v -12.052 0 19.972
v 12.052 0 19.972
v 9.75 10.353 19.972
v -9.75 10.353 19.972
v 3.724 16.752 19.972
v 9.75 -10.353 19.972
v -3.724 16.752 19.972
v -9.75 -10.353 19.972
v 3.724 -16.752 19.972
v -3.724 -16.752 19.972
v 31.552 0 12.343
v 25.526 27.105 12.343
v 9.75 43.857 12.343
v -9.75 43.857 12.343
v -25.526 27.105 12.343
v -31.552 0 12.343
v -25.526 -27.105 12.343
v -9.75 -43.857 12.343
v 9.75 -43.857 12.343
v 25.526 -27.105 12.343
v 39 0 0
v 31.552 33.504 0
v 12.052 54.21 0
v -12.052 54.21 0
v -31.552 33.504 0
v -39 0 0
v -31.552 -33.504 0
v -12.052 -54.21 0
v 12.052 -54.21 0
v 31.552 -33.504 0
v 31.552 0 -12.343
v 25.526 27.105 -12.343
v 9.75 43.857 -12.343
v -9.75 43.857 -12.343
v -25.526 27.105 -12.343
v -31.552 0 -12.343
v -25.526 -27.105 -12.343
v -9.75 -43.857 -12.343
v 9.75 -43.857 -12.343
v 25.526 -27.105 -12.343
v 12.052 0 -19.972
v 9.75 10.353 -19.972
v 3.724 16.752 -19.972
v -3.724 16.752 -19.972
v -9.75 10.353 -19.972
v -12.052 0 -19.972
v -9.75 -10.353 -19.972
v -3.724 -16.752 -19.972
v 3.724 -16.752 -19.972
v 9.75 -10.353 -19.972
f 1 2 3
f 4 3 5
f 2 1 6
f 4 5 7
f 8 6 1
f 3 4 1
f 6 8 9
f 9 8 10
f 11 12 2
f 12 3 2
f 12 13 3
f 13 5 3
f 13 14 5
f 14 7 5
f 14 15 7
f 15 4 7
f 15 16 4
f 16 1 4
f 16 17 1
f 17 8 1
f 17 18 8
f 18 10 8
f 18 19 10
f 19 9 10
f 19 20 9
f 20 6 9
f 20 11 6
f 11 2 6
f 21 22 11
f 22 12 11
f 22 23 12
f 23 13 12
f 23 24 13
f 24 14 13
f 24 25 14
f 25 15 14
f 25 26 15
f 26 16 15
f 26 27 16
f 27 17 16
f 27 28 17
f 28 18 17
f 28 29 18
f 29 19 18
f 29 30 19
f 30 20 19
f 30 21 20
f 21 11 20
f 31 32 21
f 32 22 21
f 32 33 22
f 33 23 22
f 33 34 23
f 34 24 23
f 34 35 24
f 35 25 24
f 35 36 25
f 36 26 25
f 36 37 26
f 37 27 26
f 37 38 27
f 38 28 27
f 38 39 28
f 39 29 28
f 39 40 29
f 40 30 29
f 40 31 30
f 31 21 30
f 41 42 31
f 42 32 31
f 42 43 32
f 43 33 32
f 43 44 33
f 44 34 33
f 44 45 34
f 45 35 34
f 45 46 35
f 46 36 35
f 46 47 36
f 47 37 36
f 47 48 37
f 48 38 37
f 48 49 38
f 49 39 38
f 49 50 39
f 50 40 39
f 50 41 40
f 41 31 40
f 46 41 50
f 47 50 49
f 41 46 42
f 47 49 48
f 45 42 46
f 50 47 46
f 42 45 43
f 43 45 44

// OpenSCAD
// Generated by SolidPython 1.0.1 on 2020-07-29 00:46:51


scale(v = [13, 19, 7]) {
	sphere(r = 3);
}
/***********************************************
*********      SolidPython code:      **********
************************************************
 
# import packages: SolidPython
from solid import *
from solid.utils import *
from itertools import chain, combinations, permutations


class Resize:

    def __init__(self, scad_file):
        self.scad_file = scad_file
        #self.scad_file = import_scad(scad_file)
        # cone/cylinder param:
        self.r1 = 0
        self.r2 = 0
        self.h = 0
        # rectangular prism param:
        self.w = 0
        self.l = 0
        # ellipse param:
        self.r = 0

    # import OpenScad code (file name corresponds to shape)


    # classify shape + parameters
    def assign(self, param1, param2, param3):
        if self.scad_file == 'cone.scad':
            self.r1 = param1
            self.r2 = param2
            self.h = param3
        elif self.scad_file == 'cylinder.scad':
            self.r1 = param1
            self.r2 = param2
            self.h = param3
        elif self.scad_file == 'rectangularPrism.scad':
            self.h = param1
            self.l = param2
            self.w = param3
        else:
            self.r = param1
            self.h = param2

    # resize parameters
    def iterate(self):
        x = range(3, 20, 2)
        i = 1
        if self.scad_file == 'cone.scad':
            tempList = list(permutations(x, 2))
            for temp in tempList:
                param1 = temp[0]
                param2 = temp[1]
                filepath = 'produced_scad_files/' + 'cone' + str(param1) + '_' + str(param2) + '_' + '.scad'
                scad_render_to_file(cylinder(h=param1, r1=param2, r2=0), filepath)

        elif self.scad_file == 'cylinder.scad':
            tempList = list(permutations(x, 3))
            for temp in tempList:
                param1 = temp[0]
                param2 = temp[1]
                filepath = 'produced_scad_files/' + 'cylinder' + str(param1) + '_' + str(param2) + '_' + '.scad'
                scad_render_to_file(cylinder(h=param1, r1=param2, r2=param2), filepath)

        elif self.scad_file == 'rectangularPrism.scad':
            tempList = list(permutations(x, 3))
            for temp in tempList:
                param1 = temp[0]
                param2 = temp[1]
                param3 = temp[2]
                filepath = 'produced_scad_files/' + 'rectangularPrism' + str(param1) + '_' + str(param2) + '_' + str(
                    param3) + '.scad'
                scad_render_to_file(cube(size=(param1, param2, param3)), filepath)

        elif self.scad_file == 'ellipse.scad':
            tempList = list(permutations(x, 4))
            for temp in tempList:
                param1 = temp[0]
                param2 = temp[1]
                param3 = temp[2]
                param4 = temp[3]
                filepath = 'produced_scad_files/' + 'ellipse' + str(param1) + '_' + str(param2) + '_' + str(param3) + '_' + str(param4) + '.scad'
                scad_render_to_file(scale([param1, param2, param3])(sphere(r=param4)), filepath)

    def render_to_scadfile(self):
        scad_render_to_file(scad, 'example.scad') 
 
************************************************/
